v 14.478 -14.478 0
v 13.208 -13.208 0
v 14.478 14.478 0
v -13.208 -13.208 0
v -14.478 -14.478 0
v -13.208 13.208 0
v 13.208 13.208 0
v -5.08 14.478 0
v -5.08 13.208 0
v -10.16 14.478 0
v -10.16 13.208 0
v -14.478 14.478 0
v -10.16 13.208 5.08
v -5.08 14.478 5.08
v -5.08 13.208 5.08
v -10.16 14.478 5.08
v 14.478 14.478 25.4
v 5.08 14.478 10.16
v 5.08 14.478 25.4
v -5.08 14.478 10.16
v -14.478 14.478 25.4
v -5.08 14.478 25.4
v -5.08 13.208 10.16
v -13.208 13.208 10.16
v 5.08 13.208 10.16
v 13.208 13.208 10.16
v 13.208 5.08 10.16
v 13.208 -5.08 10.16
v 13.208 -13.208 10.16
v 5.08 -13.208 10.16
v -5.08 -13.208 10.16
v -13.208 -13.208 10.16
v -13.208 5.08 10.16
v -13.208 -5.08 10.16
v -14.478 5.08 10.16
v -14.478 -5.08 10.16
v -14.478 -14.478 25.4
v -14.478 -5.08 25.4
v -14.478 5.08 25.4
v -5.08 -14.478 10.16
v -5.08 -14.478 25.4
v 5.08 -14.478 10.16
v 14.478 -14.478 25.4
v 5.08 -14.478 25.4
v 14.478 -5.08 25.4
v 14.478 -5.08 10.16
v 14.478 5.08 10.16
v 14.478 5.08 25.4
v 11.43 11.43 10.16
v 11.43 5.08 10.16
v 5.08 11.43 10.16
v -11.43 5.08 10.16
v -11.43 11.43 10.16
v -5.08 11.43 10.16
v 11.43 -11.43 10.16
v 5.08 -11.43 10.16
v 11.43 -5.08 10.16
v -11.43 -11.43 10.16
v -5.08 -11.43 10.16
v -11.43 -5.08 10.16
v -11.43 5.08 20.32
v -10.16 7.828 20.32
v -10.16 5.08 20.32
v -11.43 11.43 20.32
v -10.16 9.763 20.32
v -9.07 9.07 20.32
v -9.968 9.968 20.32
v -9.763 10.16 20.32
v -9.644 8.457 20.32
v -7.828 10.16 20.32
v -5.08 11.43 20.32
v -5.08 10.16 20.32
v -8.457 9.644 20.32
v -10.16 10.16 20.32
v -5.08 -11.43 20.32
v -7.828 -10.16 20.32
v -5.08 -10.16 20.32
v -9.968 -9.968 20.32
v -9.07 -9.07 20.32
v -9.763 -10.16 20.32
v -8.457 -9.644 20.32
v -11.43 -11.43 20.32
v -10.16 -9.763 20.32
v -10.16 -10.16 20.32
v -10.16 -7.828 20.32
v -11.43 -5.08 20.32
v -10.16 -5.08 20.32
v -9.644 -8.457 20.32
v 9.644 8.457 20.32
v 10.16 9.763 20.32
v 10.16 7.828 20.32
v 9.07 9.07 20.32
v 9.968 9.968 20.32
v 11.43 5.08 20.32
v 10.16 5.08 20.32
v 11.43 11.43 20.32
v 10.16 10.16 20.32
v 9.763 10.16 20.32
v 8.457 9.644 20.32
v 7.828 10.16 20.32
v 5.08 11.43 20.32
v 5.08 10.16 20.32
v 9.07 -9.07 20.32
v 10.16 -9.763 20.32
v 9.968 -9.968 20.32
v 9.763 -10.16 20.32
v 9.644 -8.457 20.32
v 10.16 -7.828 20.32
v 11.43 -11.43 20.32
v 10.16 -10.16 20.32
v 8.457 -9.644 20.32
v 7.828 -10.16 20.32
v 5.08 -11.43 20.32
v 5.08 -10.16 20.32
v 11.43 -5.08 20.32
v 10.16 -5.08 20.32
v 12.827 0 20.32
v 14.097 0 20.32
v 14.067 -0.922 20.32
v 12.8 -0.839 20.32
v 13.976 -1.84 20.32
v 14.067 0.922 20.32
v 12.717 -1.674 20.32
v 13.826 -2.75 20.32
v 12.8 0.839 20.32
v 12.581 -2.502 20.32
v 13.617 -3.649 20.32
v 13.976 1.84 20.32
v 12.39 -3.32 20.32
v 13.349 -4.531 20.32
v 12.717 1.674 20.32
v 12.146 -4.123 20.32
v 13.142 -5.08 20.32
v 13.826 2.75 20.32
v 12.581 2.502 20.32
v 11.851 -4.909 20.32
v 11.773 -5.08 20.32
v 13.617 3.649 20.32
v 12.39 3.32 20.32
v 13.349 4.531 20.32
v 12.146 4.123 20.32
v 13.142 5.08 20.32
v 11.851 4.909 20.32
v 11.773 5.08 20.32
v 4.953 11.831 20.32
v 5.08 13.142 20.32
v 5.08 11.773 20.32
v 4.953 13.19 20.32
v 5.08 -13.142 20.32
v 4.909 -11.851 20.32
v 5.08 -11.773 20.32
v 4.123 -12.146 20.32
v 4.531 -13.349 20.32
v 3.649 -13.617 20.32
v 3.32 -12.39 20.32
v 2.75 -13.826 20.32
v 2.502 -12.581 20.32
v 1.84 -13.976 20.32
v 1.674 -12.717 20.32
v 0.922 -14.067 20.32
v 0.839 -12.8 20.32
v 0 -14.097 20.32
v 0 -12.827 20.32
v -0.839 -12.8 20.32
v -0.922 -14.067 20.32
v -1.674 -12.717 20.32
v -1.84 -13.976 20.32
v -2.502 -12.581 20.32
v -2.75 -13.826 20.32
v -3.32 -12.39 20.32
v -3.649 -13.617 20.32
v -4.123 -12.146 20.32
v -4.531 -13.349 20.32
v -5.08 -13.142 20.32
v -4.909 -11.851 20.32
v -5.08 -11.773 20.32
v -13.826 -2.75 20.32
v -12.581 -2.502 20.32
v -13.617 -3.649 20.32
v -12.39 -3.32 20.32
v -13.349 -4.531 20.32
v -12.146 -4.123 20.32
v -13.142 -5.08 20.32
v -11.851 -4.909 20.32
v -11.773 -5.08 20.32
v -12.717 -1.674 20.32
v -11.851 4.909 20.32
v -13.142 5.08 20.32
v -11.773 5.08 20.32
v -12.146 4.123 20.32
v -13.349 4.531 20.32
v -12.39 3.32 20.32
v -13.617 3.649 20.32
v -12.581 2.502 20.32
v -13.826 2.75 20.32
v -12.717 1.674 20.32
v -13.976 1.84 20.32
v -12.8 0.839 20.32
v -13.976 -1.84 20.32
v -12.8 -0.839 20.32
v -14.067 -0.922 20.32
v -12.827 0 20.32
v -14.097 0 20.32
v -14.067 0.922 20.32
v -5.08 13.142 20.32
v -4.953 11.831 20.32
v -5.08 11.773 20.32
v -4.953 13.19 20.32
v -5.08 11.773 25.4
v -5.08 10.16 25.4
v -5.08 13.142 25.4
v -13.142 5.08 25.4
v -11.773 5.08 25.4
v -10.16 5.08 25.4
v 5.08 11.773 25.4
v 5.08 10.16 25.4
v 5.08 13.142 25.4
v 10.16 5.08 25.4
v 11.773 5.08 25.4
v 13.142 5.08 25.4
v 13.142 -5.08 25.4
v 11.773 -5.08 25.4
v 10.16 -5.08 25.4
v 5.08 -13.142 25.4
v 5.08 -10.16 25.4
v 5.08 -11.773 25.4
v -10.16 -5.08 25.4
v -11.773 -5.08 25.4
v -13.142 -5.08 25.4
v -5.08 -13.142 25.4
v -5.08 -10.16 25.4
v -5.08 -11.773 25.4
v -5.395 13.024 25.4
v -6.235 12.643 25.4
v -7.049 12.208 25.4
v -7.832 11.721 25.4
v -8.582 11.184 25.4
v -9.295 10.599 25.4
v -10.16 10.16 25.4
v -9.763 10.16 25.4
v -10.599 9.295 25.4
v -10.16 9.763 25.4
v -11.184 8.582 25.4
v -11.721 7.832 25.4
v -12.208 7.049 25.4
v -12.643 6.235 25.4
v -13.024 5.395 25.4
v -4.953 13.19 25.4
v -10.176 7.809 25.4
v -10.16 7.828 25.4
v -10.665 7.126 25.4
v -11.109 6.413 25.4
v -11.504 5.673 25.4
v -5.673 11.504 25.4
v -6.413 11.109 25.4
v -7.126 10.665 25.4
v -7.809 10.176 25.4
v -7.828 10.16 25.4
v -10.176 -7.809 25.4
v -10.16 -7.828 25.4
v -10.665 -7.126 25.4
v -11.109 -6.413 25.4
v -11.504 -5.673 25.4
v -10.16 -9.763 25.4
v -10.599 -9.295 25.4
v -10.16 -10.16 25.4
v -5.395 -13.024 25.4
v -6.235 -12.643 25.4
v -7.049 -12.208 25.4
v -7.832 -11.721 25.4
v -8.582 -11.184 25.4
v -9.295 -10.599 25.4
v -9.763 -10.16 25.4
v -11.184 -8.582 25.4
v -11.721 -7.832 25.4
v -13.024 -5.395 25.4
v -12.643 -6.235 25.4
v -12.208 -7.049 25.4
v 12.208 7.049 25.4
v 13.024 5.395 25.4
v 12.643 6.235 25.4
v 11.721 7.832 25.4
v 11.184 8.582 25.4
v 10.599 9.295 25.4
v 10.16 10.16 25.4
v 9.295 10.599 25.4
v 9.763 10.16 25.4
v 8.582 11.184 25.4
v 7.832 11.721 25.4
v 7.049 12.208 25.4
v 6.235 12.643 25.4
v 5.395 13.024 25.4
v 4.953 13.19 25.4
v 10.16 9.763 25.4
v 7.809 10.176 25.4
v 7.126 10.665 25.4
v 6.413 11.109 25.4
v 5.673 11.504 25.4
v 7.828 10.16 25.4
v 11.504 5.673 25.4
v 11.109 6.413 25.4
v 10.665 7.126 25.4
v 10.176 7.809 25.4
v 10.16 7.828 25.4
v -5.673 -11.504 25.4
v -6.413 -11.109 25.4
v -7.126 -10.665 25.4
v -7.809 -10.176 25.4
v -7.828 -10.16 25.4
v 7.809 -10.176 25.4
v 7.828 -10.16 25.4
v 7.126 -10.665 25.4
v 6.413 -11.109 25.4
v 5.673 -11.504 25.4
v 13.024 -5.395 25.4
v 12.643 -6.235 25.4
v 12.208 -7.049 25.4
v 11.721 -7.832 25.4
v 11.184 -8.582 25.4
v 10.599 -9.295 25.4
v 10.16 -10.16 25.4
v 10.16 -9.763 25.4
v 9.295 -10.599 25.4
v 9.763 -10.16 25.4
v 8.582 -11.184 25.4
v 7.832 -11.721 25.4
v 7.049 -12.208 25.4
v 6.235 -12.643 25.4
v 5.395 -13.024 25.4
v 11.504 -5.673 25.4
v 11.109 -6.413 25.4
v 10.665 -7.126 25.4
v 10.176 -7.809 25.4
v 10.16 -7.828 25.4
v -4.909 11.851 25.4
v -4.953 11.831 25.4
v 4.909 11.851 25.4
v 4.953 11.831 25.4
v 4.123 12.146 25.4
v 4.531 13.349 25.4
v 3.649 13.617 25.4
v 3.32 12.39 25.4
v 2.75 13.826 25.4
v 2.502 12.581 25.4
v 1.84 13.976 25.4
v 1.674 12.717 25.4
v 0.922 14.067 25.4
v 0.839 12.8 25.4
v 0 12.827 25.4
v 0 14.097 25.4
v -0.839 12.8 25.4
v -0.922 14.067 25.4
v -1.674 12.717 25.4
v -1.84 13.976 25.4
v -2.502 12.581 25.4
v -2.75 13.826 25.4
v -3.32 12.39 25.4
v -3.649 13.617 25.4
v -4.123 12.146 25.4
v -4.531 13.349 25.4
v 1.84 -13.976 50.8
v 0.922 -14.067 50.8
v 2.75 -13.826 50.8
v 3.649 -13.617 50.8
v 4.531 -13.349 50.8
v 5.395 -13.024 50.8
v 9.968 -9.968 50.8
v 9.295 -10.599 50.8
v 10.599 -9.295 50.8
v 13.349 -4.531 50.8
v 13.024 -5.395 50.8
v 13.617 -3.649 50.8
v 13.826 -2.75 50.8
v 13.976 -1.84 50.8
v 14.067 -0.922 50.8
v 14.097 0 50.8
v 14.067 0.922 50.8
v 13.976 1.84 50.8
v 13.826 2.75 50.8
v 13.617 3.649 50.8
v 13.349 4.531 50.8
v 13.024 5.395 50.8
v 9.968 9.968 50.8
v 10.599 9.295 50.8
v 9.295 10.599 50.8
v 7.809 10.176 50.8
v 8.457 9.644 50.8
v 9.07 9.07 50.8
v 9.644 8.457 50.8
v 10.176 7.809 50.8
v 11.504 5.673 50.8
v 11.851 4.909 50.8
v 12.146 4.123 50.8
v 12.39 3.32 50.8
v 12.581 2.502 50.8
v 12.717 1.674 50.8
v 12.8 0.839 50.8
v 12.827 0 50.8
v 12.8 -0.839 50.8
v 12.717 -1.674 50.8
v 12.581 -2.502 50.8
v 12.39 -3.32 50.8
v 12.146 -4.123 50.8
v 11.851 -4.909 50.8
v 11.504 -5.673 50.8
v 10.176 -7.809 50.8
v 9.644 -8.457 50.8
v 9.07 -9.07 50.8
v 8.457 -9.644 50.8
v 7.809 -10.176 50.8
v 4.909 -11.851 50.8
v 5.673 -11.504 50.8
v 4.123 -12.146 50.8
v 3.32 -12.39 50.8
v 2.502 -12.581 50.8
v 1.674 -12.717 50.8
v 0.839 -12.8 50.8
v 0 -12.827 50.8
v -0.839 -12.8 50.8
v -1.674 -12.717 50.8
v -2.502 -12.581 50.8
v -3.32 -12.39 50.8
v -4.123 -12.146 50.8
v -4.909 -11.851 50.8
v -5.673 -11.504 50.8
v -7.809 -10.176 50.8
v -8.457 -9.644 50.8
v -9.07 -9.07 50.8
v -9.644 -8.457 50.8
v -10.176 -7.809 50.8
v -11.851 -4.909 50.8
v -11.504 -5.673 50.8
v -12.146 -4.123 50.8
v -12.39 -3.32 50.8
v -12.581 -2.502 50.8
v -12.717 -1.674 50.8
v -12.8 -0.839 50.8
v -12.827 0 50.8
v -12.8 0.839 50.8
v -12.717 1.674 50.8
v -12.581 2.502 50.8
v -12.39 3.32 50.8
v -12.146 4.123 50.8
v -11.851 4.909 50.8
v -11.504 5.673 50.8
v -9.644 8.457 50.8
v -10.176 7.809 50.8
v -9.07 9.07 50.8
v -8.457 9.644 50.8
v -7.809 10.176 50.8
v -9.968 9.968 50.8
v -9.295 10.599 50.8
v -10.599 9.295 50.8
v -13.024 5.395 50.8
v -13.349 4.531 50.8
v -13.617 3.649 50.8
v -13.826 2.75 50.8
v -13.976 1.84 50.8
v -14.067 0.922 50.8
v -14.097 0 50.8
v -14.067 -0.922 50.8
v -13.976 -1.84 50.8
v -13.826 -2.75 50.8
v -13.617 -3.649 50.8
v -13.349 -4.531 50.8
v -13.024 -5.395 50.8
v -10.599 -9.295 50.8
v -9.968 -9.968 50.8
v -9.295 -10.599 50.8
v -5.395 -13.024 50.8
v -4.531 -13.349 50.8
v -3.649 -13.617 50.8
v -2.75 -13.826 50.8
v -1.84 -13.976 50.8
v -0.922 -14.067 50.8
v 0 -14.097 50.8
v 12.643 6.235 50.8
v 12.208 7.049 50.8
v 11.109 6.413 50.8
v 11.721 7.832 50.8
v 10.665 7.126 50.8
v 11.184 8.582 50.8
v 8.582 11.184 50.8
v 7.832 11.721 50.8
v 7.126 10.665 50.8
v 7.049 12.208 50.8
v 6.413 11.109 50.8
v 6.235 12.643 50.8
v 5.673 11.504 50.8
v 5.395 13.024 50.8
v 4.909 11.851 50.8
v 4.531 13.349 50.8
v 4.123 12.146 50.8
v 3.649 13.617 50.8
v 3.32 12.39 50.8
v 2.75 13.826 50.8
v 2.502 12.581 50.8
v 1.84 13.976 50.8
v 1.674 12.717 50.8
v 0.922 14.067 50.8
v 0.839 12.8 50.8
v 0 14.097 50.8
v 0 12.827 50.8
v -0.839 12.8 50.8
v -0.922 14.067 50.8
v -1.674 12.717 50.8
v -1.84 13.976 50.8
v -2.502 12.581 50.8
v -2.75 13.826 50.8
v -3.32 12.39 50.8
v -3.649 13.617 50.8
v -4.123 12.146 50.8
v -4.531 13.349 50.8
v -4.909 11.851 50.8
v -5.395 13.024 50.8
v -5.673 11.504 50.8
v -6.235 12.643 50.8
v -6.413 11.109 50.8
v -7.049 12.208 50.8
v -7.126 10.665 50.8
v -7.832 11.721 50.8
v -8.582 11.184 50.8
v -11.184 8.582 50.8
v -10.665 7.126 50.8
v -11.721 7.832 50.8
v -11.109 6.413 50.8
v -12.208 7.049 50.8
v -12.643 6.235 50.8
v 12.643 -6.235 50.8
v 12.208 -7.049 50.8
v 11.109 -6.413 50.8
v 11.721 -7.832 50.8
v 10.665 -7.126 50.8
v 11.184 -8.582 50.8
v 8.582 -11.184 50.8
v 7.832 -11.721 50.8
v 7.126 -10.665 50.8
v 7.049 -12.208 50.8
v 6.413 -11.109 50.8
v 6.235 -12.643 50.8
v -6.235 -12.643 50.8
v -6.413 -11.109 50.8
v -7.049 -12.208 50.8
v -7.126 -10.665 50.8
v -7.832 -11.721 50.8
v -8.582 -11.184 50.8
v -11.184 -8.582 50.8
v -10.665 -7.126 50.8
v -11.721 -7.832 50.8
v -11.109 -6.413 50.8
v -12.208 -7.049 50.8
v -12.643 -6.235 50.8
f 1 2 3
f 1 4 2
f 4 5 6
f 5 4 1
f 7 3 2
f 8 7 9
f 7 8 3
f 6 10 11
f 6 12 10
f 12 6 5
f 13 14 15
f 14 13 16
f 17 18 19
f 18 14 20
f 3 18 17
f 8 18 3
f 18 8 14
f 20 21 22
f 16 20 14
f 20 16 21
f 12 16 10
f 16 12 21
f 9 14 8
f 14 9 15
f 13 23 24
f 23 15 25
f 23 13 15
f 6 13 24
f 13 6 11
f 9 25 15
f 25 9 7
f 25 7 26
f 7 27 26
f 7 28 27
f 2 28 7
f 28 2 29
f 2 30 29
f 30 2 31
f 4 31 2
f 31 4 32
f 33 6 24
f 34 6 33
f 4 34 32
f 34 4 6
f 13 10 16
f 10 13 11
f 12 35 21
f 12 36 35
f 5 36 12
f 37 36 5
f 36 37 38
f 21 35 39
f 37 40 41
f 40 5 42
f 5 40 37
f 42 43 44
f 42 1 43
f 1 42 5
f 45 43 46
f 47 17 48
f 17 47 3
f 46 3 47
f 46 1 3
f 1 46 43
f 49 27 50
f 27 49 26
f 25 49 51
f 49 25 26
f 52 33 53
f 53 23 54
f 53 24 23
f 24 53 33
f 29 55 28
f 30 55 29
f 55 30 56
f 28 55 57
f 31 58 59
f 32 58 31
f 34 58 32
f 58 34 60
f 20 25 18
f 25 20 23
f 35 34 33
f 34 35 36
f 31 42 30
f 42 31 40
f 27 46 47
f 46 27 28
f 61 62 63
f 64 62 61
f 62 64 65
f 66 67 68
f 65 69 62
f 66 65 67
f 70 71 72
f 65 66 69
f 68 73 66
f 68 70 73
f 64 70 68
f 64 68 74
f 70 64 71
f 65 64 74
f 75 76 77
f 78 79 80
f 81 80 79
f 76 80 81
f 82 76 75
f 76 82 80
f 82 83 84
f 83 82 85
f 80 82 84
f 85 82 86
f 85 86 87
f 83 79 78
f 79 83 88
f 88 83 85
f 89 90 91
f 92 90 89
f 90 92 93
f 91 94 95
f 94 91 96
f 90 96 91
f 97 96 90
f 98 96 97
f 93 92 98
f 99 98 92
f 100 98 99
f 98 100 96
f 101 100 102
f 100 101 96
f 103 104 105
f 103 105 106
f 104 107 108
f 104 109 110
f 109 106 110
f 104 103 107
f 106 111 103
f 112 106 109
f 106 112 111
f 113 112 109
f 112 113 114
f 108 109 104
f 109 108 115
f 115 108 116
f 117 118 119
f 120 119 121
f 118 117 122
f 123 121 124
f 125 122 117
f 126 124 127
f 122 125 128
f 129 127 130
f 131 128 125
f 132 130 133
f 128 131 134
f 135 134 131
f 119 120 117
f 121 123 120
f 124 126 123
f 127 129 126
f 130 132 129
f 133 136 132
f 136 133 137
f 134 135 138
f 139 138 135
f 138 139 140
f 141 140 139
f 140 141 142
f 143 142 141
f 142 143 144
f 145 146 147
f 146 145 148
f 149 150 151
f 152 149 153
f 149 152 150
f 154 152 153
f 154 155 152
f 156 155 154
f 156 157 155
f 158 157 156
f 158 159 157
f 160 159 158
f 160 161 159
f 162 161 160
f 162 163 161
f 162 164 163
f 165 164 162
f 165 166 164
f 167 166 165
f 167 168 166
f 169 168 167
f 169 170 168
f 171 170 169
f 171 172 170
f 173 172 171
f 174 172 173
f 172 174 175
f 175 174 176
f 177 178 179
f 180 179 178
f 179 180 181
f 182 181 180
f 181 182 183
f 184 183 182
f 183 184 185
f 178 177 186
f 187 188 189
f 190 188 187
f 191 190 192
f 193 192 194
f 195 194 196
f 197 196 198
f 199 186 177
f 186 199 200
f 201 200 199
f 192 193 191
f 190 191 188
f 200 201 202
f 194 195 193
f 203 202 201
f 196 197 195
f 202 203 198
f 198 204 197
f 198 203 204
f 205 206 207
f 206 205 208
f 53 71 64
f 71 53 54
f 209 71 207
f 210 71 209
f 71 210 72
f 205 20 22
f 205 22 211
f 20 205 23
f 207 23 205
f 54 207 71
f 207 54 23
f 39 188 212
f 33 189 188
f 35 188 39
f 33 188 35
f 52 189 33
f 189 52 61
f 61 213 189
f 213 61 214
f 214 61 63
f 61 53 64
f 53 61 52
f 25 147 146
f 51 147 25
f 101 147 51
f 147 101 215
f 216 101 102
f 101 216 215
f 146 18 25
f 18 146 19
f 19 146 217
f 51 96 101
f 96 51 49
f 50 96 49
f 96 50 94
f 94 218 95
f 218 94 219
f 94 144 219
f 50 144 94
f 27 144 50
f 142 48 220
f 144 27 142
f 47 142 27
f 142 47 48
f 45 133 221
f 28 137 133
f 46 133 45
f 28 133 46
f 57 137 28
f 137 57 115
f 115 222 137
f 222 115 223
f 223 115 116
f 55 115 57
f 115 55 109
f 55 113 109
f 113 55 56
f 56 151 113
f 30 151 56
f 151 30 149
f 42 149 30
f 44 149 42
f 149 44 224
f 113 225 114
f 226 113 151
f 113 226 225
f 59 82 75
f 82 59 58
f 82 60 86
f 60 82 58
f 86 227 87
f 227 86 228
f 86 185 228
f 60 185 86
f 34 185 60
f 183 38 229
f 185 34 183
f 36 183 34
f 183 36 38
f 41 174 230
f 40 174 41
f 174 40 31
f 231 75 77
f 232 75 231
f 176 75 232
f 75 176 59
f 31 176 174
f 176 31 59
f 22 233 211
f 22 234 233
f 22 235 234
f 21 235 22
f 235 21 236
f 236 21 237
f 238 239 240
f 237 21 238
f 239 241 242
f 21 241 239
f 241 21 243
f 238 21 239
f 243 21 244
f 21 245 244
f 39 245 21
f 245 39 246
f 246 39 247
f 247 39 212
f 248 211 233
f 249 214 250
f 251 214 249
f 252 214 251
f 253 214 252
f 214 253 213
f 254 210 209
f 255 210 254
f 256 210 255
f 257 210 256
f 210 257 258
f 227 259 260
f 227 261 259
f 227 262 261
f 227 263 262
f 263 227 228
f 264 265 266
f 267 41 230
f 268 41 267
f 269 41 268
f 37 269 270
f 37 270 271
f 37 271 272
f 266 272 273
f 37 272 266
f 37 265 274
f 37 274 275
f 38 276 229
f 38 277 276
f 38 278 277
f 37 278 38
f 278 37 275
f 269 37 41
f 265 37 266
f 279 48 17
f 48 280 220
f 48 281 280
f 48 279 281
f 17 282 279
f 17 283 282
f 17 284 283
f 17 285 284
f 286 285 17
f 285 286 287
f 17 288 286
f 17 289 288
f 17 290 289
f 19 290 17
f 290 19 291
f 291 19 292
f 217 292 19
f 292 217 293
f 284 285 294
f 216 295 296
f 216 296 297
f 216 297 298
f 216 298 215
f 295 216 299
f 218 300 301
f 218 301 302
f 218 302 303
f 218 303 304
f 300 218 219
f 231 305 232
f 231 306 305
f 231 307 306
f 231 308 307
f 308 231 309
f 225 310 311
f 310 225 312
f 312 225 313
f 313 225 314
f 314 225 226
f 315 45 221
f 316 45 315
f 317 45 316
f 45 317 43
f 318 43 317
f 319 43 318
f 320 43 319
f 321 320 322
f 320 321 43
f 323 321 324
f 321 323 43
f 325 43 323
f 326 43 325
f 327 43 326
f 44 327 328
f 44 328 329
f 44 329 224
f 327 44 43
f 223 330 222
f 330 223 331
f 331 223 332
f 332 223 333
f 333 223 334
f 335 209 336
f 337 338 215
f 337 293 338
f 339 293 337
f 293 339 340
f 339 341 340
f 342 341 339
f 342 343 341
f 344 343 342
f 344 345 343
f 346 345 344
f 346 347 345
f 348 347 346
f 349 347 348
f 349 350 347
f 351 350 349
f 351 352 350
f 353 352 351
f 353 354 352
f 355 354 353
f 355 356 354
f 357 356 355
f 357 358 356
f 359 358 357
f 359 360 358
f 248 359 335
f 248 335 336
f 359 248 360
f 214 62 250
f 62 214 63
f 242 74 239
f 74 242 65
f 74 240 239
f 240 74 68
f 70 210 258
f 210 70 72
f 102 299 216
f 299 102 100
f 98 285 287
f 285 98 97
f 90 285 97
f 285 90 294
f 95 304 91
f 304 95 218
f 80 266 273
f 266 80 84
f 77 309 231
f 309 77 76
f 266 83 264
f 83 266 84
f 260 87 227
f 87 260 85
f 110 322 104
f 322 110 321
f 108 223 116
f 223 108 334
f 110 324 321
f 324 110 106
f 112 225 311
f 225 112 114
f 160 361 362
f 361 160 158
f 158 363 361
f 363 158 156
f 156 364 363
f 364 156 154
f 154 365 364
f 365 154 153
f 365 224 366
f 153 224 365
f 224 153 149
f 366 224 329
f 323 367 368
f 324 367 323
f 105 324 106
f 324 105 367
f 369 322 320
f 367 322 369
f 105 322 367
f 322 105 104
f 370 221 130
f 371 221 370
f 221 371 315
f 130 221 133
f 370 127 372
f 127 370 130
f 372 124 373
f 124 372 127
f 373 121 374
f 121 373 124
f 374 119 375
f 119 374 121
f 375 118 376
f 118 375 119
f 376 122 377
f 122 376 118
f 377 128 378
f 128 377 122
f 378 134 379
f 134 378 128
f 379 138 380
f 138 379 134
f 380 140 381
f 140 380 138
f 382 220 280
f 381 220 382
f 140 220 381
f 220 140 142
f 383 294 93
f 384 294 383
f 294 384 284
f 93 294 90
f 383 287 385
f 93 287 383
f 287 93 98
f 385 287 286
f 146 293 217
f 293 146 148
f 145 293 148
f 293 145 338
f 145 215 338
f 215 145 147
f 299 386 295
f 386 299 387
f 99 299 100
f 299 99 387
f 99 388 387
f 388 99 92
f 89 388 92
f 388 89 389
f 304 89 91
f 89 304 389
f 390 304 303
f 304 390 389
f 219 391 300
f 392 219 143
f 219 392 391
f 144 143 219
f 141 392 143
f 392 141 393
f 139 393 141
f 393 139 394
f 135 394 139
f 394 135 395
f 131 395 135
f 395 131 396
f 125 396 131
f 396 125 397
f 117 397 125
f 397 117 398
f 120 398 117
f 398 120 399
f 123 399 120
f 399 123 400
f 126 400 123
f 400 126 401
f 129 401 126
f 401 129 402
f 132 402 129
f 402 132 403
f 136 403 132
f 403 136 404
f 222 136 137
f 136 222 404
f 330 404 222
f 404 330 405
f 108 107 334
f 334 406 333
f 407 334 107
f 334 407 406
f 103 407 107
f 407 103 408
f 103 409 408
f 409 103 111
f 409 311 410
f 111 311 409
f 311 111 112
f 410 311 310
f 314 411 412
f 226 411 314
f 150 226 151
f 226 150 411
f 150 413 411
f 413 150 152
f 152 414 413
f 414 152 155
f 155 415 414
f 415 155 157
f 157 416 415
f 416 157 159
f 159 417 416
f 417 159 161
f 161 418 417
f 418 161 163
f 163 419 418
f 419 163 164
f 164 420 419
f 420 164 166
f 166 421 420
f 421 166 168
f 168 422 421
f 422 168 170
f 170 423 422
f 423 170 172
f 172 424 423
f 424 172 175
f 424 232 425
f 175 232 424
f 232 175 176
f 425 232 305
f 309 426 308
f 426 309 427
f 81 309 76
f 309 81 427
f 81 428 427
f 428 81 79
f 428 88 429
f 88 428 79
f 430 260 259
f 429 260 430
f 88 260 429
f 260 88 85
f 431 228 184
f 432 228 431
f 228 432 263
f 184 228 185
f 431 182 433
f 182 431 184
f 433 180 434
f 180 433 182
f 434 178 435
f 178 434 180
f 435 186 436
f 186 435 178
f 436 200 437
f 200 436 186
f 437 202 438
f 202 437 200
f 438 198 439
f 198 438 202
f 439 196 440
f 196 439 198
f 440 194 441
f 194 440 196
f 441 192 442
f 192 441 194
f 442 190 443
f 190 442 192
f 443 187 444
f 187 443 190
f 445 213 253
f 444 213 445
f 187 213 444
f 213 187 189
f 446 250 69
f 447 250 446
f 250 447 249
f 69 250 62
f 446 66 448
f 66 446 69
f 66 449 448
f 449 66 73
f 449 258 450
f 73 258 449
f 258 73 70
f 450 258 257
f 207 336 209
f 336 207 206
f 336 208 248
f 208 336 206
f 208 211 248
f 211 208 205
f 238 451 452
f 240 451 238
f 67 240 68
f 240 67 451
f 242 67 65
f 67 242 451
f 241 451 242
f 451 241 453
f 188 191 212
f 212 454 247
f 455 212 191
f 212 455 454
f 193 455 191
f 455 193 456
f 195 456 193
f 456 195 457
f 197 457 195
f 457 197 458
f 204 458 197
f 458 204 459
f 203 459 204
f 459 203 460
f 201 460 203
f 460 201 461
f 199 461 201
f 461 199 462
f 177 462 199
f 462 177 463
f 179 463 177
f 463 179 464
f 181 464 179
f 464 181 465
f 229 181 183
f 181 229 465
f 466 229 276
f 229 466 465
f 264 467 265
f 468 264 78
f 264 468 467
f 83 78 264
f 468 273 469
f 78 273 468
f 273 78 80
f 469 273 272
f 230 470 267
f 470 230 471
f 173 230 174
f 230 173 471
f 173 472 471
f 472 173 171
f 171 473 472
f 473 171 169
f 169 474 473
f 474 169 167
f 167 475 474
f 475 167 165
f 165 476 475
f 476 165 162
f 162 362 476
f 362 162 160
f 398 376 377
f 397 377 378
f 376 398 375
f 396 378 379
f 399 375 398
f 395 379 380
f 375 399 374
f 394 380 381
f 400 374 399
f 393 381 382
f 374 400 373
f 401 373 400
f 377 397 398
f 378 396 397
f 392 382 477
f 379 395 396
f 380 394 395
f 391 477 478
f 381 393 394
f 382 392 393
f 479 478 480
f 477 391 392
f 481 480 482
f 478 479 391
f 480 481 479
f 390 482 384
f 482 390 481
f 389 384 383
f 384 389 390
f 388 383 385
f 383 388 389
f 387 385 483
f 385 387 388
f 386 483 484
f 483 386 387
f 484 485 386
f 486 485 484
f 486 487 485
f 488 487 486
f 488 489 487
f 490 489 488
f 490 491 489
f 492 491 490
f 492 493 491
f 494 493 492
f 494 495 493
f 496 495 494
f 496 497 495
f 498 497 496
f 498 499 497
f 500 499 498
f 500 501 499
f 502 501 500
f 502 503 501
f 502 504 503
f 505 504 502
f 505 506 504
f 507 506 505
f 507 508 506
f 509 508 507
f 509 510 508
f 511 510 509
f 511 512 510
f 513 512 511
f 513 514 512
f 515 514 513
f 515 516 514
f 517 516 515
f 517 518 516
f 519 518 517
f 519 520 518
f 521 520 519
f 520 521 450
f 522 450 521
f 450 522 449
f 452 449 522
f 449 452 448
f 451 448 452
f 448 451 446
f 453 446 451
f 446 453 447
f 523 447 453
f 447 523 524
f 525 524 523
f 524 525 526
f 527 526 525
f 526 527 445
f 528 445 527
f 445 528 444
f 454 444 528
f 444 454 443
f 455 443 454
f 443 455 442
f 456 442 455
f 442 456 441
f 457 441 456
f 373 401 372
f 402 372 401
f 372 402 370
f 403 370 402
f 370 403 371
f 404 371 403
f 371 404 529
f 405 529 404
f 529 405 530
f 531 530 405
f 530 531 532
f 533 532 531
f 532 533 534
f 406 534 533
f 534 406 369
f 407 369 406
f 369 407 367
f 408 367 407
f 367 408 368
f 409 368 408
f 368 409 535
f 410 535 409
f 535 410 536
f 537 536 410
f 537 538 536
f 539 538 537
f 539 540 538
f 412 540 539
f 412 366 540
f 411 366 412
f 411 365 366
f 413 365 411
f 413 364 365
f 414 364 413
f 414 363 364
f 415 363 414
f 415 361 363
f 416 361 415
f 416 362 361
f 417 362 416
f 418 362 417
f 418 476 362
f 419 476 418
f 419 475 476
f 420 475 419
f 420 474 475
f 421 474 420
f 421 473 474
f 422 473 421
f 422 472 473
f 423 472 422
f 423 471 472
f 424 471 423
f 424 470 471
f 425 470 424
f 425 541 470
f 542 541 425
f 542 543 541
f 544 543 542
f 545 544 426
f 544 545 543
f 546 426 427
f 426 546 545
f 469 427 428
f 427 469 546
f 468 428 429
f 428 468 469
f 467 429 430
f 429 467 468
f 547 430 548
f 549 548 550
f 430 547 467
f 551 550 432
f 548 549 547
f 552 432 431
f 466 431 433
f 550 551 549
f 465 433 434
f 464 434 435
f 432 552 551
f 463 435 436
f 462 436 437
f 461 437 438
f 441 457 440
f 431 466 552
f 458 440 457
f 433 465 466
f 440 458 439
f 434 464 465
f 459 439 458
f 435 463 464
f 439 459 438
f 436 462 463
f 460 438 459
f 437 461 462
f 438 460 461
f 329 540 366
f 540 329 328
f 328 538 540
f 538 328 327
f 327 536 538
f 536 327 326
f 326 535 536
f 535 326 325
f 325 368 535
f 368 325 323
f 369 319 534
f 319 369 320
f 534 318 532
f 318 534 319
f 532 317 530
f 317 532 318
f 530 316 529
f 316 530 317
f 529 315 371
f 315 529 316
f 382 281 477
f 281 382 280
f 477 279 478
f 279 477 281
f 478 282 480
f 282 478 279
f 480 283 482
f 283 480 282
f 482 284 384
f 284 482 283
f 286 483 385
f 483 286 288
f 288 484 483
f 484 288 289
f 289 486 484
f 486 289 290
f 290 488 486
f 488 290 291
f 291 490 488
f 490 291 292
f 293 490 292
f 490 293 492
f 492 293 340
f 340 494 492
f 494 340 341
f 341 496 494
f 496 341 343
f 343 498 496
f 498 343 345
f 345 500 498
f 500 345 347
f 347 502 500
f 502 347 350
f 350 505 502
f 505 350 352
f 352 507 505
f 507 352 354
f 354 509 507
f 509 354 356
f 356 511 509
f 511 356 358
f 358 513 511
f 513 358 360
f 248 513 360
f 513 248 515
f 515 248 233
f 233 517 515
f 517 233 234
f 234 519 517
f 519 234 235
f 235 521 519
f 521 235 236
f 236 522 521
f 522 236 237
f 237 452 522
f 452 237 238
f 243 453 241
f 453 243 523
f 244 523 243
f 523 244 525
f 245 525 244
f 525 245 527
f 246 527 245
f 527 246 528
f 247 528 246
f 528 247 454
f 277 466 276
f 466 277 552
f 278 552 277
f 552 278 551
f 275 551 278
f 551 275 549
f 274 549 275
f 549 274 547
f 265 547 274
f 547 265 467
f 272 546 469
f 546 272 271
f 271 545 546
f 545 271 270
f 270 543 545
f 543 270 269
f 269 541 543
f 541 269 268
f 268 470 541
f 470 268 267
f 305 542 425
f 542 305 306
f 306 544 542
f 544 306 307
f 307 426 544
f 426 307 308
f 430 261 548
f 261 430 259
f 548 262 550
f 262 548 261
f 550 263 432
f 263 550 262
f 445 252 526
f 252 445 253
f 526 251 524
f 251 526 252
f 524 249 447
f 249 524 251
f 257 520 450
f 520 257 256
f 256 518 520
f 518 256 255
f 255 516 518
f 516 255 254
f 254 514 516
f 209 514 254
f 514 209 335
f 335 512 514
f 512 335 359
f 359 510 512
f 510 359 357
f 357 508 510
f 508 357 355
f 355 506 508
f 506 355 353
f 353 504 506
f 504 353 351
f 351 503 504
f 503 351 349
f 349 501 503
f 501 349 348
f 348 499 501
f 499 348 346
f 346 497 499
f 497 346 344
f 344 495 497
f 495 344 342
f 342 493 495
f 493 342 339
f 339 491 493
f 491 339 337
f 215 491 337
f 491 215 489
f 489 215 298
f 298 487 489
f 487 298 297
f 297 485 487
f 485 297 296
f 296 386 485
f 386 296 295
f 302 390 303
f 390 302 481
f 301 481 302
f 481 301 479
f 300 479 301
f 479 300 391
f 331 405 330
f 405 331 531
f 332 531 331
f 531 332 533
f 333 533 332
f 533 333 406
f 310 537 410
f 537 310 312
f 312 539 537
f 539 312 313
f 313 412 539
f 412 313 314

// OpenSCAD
ViewScale = [0.0254, 0.0254, 0.0254];

//module cutouts()
//{
//    difference() {
//        circle(1460/2, $fn=96);
//        circle(1360/2, $fn=96);
//        // tab
//        translate([0, 700, 0])
//        square([400, 200], center=true);
//        // tab
//        rotate([0, 0, 120]) 
//        translate([0, 700, 0])
//        square([400, 200], center=true);
//        // tab
//        rotate([0, 0, 240]) 
//        translate([0, 700, 0])
//        square([400, 200], center=true);
//    }
//}

module rotcutouts() {
    for(ii=[0:90:360]) {
        rotate([0, 0, ii])
        translate([0, 500, 0])
        square([400, 200], center=true);
    }
}

//module bodymain()
//{
//    difference() {
//        circle(1460/2, $fn=96);
//        circle(1360/2, $fn=96);
//    }
//}

//module bodycutout()
//{
//    difference() {
//        circle(1460/2, $fn=96);
//        circle(1360/2, $fn=96);
//        *square([1020, 1020], center=true);
//        translate([0, 700, 0])
//        square([400, 200], center=true);
//        scale([1.3,1.3,1.3])
//        translate([0, 500, 0])
//        square([400, 200], center=true);
//        //rotcutouts();
//    }
//}

module bodycutout2()
{
    difference() {
        circle(1110/2, $fn=96);
        circle(1010/2, $fn=96);
        scale([1.3,1.3,1.3])
        translate([0, 450, 0])
        square([300, 200], center=true);
        //rotcutouts();
    }
}

module bodycutout3()
{
    difference() {
        circle(1110/2, $fn=96);
        circle(1010/2, $fn=96);
        *scale([1.3,1.3,1.3])
        translate([0, 500, 0])
        square([400, 200], center=true);
        //rotcutouts();
    }
}

module ledframe2()
{
    difference() {
    square([1140, 1140], center=true);
    square([800, 800], center=true);
    rotcutouts();
//    translate([0, 500, 0])
//    square([400, 200], center=true);
    }
}

module ledframe1()
{
    difference() {
        square([1140, 1140], center=true);
        square([900, 900], center=true);
        rotcutouts();
    }
}

module support()
{
    difference() {
    square([860, 860], center=true);
    square([760, 760], center=true);
    }
}

module ledmount()
{
    #linear_extrude(200)
    difference() {
        square([1140, 1140], center=true);
        square([1040, 1040], center=true);
        translate([-300, 550, 0])
        square([200, 100], center=true);
    }
    #translate([0, 0, 200])
    linear_extrude(200)
    difference() {
        square([1140, 1140], center=true);
        square([1040, 1040], center=true);
    }
    #translate([0, 0, 400])
    linear_extrude(400){
        ledframe1();
    }

    #translate([0, 0, 800])
    linear_extrude(200)
    ledframe2();

    translate([0, 0, 800])
    linear_extrude(200)
    bodycutout2();

    translate([0, 0, 1000])
    linear_extrude(1000)
    bodycutout3();

}

module lensmount() 
{
    // base
    linear_extrude(300)
    difference() {
    circle(1460/2, $fn=96);
    circle(1360/2, $fn=96);
    }

    // support1
    linear_extrude(270)
    difference() {
    circle(1330/2, $fn=96);
    circle(1180/2, $fn=96);
    }

    // support2
    linear_extrude(270)
    difference() {
    circle(1150/2, $fn=96);
    circle(1000/2, $fn=96);
    }

    translate([0, 0, 300])
    linear_extrude(50)
    difference() {
    circle(1460/2, $fn=96);
    circle(1010/2, $fn=96);
    }

    translate([0, 0, 350])
    linear_extrude(500)
    bodycutout3();
}

scale(ViewScale)
{
    ledmount();
    //linear_extrude(170)
    //support();
    //translate([0, 1300, 0])
    //lensmount();
}
